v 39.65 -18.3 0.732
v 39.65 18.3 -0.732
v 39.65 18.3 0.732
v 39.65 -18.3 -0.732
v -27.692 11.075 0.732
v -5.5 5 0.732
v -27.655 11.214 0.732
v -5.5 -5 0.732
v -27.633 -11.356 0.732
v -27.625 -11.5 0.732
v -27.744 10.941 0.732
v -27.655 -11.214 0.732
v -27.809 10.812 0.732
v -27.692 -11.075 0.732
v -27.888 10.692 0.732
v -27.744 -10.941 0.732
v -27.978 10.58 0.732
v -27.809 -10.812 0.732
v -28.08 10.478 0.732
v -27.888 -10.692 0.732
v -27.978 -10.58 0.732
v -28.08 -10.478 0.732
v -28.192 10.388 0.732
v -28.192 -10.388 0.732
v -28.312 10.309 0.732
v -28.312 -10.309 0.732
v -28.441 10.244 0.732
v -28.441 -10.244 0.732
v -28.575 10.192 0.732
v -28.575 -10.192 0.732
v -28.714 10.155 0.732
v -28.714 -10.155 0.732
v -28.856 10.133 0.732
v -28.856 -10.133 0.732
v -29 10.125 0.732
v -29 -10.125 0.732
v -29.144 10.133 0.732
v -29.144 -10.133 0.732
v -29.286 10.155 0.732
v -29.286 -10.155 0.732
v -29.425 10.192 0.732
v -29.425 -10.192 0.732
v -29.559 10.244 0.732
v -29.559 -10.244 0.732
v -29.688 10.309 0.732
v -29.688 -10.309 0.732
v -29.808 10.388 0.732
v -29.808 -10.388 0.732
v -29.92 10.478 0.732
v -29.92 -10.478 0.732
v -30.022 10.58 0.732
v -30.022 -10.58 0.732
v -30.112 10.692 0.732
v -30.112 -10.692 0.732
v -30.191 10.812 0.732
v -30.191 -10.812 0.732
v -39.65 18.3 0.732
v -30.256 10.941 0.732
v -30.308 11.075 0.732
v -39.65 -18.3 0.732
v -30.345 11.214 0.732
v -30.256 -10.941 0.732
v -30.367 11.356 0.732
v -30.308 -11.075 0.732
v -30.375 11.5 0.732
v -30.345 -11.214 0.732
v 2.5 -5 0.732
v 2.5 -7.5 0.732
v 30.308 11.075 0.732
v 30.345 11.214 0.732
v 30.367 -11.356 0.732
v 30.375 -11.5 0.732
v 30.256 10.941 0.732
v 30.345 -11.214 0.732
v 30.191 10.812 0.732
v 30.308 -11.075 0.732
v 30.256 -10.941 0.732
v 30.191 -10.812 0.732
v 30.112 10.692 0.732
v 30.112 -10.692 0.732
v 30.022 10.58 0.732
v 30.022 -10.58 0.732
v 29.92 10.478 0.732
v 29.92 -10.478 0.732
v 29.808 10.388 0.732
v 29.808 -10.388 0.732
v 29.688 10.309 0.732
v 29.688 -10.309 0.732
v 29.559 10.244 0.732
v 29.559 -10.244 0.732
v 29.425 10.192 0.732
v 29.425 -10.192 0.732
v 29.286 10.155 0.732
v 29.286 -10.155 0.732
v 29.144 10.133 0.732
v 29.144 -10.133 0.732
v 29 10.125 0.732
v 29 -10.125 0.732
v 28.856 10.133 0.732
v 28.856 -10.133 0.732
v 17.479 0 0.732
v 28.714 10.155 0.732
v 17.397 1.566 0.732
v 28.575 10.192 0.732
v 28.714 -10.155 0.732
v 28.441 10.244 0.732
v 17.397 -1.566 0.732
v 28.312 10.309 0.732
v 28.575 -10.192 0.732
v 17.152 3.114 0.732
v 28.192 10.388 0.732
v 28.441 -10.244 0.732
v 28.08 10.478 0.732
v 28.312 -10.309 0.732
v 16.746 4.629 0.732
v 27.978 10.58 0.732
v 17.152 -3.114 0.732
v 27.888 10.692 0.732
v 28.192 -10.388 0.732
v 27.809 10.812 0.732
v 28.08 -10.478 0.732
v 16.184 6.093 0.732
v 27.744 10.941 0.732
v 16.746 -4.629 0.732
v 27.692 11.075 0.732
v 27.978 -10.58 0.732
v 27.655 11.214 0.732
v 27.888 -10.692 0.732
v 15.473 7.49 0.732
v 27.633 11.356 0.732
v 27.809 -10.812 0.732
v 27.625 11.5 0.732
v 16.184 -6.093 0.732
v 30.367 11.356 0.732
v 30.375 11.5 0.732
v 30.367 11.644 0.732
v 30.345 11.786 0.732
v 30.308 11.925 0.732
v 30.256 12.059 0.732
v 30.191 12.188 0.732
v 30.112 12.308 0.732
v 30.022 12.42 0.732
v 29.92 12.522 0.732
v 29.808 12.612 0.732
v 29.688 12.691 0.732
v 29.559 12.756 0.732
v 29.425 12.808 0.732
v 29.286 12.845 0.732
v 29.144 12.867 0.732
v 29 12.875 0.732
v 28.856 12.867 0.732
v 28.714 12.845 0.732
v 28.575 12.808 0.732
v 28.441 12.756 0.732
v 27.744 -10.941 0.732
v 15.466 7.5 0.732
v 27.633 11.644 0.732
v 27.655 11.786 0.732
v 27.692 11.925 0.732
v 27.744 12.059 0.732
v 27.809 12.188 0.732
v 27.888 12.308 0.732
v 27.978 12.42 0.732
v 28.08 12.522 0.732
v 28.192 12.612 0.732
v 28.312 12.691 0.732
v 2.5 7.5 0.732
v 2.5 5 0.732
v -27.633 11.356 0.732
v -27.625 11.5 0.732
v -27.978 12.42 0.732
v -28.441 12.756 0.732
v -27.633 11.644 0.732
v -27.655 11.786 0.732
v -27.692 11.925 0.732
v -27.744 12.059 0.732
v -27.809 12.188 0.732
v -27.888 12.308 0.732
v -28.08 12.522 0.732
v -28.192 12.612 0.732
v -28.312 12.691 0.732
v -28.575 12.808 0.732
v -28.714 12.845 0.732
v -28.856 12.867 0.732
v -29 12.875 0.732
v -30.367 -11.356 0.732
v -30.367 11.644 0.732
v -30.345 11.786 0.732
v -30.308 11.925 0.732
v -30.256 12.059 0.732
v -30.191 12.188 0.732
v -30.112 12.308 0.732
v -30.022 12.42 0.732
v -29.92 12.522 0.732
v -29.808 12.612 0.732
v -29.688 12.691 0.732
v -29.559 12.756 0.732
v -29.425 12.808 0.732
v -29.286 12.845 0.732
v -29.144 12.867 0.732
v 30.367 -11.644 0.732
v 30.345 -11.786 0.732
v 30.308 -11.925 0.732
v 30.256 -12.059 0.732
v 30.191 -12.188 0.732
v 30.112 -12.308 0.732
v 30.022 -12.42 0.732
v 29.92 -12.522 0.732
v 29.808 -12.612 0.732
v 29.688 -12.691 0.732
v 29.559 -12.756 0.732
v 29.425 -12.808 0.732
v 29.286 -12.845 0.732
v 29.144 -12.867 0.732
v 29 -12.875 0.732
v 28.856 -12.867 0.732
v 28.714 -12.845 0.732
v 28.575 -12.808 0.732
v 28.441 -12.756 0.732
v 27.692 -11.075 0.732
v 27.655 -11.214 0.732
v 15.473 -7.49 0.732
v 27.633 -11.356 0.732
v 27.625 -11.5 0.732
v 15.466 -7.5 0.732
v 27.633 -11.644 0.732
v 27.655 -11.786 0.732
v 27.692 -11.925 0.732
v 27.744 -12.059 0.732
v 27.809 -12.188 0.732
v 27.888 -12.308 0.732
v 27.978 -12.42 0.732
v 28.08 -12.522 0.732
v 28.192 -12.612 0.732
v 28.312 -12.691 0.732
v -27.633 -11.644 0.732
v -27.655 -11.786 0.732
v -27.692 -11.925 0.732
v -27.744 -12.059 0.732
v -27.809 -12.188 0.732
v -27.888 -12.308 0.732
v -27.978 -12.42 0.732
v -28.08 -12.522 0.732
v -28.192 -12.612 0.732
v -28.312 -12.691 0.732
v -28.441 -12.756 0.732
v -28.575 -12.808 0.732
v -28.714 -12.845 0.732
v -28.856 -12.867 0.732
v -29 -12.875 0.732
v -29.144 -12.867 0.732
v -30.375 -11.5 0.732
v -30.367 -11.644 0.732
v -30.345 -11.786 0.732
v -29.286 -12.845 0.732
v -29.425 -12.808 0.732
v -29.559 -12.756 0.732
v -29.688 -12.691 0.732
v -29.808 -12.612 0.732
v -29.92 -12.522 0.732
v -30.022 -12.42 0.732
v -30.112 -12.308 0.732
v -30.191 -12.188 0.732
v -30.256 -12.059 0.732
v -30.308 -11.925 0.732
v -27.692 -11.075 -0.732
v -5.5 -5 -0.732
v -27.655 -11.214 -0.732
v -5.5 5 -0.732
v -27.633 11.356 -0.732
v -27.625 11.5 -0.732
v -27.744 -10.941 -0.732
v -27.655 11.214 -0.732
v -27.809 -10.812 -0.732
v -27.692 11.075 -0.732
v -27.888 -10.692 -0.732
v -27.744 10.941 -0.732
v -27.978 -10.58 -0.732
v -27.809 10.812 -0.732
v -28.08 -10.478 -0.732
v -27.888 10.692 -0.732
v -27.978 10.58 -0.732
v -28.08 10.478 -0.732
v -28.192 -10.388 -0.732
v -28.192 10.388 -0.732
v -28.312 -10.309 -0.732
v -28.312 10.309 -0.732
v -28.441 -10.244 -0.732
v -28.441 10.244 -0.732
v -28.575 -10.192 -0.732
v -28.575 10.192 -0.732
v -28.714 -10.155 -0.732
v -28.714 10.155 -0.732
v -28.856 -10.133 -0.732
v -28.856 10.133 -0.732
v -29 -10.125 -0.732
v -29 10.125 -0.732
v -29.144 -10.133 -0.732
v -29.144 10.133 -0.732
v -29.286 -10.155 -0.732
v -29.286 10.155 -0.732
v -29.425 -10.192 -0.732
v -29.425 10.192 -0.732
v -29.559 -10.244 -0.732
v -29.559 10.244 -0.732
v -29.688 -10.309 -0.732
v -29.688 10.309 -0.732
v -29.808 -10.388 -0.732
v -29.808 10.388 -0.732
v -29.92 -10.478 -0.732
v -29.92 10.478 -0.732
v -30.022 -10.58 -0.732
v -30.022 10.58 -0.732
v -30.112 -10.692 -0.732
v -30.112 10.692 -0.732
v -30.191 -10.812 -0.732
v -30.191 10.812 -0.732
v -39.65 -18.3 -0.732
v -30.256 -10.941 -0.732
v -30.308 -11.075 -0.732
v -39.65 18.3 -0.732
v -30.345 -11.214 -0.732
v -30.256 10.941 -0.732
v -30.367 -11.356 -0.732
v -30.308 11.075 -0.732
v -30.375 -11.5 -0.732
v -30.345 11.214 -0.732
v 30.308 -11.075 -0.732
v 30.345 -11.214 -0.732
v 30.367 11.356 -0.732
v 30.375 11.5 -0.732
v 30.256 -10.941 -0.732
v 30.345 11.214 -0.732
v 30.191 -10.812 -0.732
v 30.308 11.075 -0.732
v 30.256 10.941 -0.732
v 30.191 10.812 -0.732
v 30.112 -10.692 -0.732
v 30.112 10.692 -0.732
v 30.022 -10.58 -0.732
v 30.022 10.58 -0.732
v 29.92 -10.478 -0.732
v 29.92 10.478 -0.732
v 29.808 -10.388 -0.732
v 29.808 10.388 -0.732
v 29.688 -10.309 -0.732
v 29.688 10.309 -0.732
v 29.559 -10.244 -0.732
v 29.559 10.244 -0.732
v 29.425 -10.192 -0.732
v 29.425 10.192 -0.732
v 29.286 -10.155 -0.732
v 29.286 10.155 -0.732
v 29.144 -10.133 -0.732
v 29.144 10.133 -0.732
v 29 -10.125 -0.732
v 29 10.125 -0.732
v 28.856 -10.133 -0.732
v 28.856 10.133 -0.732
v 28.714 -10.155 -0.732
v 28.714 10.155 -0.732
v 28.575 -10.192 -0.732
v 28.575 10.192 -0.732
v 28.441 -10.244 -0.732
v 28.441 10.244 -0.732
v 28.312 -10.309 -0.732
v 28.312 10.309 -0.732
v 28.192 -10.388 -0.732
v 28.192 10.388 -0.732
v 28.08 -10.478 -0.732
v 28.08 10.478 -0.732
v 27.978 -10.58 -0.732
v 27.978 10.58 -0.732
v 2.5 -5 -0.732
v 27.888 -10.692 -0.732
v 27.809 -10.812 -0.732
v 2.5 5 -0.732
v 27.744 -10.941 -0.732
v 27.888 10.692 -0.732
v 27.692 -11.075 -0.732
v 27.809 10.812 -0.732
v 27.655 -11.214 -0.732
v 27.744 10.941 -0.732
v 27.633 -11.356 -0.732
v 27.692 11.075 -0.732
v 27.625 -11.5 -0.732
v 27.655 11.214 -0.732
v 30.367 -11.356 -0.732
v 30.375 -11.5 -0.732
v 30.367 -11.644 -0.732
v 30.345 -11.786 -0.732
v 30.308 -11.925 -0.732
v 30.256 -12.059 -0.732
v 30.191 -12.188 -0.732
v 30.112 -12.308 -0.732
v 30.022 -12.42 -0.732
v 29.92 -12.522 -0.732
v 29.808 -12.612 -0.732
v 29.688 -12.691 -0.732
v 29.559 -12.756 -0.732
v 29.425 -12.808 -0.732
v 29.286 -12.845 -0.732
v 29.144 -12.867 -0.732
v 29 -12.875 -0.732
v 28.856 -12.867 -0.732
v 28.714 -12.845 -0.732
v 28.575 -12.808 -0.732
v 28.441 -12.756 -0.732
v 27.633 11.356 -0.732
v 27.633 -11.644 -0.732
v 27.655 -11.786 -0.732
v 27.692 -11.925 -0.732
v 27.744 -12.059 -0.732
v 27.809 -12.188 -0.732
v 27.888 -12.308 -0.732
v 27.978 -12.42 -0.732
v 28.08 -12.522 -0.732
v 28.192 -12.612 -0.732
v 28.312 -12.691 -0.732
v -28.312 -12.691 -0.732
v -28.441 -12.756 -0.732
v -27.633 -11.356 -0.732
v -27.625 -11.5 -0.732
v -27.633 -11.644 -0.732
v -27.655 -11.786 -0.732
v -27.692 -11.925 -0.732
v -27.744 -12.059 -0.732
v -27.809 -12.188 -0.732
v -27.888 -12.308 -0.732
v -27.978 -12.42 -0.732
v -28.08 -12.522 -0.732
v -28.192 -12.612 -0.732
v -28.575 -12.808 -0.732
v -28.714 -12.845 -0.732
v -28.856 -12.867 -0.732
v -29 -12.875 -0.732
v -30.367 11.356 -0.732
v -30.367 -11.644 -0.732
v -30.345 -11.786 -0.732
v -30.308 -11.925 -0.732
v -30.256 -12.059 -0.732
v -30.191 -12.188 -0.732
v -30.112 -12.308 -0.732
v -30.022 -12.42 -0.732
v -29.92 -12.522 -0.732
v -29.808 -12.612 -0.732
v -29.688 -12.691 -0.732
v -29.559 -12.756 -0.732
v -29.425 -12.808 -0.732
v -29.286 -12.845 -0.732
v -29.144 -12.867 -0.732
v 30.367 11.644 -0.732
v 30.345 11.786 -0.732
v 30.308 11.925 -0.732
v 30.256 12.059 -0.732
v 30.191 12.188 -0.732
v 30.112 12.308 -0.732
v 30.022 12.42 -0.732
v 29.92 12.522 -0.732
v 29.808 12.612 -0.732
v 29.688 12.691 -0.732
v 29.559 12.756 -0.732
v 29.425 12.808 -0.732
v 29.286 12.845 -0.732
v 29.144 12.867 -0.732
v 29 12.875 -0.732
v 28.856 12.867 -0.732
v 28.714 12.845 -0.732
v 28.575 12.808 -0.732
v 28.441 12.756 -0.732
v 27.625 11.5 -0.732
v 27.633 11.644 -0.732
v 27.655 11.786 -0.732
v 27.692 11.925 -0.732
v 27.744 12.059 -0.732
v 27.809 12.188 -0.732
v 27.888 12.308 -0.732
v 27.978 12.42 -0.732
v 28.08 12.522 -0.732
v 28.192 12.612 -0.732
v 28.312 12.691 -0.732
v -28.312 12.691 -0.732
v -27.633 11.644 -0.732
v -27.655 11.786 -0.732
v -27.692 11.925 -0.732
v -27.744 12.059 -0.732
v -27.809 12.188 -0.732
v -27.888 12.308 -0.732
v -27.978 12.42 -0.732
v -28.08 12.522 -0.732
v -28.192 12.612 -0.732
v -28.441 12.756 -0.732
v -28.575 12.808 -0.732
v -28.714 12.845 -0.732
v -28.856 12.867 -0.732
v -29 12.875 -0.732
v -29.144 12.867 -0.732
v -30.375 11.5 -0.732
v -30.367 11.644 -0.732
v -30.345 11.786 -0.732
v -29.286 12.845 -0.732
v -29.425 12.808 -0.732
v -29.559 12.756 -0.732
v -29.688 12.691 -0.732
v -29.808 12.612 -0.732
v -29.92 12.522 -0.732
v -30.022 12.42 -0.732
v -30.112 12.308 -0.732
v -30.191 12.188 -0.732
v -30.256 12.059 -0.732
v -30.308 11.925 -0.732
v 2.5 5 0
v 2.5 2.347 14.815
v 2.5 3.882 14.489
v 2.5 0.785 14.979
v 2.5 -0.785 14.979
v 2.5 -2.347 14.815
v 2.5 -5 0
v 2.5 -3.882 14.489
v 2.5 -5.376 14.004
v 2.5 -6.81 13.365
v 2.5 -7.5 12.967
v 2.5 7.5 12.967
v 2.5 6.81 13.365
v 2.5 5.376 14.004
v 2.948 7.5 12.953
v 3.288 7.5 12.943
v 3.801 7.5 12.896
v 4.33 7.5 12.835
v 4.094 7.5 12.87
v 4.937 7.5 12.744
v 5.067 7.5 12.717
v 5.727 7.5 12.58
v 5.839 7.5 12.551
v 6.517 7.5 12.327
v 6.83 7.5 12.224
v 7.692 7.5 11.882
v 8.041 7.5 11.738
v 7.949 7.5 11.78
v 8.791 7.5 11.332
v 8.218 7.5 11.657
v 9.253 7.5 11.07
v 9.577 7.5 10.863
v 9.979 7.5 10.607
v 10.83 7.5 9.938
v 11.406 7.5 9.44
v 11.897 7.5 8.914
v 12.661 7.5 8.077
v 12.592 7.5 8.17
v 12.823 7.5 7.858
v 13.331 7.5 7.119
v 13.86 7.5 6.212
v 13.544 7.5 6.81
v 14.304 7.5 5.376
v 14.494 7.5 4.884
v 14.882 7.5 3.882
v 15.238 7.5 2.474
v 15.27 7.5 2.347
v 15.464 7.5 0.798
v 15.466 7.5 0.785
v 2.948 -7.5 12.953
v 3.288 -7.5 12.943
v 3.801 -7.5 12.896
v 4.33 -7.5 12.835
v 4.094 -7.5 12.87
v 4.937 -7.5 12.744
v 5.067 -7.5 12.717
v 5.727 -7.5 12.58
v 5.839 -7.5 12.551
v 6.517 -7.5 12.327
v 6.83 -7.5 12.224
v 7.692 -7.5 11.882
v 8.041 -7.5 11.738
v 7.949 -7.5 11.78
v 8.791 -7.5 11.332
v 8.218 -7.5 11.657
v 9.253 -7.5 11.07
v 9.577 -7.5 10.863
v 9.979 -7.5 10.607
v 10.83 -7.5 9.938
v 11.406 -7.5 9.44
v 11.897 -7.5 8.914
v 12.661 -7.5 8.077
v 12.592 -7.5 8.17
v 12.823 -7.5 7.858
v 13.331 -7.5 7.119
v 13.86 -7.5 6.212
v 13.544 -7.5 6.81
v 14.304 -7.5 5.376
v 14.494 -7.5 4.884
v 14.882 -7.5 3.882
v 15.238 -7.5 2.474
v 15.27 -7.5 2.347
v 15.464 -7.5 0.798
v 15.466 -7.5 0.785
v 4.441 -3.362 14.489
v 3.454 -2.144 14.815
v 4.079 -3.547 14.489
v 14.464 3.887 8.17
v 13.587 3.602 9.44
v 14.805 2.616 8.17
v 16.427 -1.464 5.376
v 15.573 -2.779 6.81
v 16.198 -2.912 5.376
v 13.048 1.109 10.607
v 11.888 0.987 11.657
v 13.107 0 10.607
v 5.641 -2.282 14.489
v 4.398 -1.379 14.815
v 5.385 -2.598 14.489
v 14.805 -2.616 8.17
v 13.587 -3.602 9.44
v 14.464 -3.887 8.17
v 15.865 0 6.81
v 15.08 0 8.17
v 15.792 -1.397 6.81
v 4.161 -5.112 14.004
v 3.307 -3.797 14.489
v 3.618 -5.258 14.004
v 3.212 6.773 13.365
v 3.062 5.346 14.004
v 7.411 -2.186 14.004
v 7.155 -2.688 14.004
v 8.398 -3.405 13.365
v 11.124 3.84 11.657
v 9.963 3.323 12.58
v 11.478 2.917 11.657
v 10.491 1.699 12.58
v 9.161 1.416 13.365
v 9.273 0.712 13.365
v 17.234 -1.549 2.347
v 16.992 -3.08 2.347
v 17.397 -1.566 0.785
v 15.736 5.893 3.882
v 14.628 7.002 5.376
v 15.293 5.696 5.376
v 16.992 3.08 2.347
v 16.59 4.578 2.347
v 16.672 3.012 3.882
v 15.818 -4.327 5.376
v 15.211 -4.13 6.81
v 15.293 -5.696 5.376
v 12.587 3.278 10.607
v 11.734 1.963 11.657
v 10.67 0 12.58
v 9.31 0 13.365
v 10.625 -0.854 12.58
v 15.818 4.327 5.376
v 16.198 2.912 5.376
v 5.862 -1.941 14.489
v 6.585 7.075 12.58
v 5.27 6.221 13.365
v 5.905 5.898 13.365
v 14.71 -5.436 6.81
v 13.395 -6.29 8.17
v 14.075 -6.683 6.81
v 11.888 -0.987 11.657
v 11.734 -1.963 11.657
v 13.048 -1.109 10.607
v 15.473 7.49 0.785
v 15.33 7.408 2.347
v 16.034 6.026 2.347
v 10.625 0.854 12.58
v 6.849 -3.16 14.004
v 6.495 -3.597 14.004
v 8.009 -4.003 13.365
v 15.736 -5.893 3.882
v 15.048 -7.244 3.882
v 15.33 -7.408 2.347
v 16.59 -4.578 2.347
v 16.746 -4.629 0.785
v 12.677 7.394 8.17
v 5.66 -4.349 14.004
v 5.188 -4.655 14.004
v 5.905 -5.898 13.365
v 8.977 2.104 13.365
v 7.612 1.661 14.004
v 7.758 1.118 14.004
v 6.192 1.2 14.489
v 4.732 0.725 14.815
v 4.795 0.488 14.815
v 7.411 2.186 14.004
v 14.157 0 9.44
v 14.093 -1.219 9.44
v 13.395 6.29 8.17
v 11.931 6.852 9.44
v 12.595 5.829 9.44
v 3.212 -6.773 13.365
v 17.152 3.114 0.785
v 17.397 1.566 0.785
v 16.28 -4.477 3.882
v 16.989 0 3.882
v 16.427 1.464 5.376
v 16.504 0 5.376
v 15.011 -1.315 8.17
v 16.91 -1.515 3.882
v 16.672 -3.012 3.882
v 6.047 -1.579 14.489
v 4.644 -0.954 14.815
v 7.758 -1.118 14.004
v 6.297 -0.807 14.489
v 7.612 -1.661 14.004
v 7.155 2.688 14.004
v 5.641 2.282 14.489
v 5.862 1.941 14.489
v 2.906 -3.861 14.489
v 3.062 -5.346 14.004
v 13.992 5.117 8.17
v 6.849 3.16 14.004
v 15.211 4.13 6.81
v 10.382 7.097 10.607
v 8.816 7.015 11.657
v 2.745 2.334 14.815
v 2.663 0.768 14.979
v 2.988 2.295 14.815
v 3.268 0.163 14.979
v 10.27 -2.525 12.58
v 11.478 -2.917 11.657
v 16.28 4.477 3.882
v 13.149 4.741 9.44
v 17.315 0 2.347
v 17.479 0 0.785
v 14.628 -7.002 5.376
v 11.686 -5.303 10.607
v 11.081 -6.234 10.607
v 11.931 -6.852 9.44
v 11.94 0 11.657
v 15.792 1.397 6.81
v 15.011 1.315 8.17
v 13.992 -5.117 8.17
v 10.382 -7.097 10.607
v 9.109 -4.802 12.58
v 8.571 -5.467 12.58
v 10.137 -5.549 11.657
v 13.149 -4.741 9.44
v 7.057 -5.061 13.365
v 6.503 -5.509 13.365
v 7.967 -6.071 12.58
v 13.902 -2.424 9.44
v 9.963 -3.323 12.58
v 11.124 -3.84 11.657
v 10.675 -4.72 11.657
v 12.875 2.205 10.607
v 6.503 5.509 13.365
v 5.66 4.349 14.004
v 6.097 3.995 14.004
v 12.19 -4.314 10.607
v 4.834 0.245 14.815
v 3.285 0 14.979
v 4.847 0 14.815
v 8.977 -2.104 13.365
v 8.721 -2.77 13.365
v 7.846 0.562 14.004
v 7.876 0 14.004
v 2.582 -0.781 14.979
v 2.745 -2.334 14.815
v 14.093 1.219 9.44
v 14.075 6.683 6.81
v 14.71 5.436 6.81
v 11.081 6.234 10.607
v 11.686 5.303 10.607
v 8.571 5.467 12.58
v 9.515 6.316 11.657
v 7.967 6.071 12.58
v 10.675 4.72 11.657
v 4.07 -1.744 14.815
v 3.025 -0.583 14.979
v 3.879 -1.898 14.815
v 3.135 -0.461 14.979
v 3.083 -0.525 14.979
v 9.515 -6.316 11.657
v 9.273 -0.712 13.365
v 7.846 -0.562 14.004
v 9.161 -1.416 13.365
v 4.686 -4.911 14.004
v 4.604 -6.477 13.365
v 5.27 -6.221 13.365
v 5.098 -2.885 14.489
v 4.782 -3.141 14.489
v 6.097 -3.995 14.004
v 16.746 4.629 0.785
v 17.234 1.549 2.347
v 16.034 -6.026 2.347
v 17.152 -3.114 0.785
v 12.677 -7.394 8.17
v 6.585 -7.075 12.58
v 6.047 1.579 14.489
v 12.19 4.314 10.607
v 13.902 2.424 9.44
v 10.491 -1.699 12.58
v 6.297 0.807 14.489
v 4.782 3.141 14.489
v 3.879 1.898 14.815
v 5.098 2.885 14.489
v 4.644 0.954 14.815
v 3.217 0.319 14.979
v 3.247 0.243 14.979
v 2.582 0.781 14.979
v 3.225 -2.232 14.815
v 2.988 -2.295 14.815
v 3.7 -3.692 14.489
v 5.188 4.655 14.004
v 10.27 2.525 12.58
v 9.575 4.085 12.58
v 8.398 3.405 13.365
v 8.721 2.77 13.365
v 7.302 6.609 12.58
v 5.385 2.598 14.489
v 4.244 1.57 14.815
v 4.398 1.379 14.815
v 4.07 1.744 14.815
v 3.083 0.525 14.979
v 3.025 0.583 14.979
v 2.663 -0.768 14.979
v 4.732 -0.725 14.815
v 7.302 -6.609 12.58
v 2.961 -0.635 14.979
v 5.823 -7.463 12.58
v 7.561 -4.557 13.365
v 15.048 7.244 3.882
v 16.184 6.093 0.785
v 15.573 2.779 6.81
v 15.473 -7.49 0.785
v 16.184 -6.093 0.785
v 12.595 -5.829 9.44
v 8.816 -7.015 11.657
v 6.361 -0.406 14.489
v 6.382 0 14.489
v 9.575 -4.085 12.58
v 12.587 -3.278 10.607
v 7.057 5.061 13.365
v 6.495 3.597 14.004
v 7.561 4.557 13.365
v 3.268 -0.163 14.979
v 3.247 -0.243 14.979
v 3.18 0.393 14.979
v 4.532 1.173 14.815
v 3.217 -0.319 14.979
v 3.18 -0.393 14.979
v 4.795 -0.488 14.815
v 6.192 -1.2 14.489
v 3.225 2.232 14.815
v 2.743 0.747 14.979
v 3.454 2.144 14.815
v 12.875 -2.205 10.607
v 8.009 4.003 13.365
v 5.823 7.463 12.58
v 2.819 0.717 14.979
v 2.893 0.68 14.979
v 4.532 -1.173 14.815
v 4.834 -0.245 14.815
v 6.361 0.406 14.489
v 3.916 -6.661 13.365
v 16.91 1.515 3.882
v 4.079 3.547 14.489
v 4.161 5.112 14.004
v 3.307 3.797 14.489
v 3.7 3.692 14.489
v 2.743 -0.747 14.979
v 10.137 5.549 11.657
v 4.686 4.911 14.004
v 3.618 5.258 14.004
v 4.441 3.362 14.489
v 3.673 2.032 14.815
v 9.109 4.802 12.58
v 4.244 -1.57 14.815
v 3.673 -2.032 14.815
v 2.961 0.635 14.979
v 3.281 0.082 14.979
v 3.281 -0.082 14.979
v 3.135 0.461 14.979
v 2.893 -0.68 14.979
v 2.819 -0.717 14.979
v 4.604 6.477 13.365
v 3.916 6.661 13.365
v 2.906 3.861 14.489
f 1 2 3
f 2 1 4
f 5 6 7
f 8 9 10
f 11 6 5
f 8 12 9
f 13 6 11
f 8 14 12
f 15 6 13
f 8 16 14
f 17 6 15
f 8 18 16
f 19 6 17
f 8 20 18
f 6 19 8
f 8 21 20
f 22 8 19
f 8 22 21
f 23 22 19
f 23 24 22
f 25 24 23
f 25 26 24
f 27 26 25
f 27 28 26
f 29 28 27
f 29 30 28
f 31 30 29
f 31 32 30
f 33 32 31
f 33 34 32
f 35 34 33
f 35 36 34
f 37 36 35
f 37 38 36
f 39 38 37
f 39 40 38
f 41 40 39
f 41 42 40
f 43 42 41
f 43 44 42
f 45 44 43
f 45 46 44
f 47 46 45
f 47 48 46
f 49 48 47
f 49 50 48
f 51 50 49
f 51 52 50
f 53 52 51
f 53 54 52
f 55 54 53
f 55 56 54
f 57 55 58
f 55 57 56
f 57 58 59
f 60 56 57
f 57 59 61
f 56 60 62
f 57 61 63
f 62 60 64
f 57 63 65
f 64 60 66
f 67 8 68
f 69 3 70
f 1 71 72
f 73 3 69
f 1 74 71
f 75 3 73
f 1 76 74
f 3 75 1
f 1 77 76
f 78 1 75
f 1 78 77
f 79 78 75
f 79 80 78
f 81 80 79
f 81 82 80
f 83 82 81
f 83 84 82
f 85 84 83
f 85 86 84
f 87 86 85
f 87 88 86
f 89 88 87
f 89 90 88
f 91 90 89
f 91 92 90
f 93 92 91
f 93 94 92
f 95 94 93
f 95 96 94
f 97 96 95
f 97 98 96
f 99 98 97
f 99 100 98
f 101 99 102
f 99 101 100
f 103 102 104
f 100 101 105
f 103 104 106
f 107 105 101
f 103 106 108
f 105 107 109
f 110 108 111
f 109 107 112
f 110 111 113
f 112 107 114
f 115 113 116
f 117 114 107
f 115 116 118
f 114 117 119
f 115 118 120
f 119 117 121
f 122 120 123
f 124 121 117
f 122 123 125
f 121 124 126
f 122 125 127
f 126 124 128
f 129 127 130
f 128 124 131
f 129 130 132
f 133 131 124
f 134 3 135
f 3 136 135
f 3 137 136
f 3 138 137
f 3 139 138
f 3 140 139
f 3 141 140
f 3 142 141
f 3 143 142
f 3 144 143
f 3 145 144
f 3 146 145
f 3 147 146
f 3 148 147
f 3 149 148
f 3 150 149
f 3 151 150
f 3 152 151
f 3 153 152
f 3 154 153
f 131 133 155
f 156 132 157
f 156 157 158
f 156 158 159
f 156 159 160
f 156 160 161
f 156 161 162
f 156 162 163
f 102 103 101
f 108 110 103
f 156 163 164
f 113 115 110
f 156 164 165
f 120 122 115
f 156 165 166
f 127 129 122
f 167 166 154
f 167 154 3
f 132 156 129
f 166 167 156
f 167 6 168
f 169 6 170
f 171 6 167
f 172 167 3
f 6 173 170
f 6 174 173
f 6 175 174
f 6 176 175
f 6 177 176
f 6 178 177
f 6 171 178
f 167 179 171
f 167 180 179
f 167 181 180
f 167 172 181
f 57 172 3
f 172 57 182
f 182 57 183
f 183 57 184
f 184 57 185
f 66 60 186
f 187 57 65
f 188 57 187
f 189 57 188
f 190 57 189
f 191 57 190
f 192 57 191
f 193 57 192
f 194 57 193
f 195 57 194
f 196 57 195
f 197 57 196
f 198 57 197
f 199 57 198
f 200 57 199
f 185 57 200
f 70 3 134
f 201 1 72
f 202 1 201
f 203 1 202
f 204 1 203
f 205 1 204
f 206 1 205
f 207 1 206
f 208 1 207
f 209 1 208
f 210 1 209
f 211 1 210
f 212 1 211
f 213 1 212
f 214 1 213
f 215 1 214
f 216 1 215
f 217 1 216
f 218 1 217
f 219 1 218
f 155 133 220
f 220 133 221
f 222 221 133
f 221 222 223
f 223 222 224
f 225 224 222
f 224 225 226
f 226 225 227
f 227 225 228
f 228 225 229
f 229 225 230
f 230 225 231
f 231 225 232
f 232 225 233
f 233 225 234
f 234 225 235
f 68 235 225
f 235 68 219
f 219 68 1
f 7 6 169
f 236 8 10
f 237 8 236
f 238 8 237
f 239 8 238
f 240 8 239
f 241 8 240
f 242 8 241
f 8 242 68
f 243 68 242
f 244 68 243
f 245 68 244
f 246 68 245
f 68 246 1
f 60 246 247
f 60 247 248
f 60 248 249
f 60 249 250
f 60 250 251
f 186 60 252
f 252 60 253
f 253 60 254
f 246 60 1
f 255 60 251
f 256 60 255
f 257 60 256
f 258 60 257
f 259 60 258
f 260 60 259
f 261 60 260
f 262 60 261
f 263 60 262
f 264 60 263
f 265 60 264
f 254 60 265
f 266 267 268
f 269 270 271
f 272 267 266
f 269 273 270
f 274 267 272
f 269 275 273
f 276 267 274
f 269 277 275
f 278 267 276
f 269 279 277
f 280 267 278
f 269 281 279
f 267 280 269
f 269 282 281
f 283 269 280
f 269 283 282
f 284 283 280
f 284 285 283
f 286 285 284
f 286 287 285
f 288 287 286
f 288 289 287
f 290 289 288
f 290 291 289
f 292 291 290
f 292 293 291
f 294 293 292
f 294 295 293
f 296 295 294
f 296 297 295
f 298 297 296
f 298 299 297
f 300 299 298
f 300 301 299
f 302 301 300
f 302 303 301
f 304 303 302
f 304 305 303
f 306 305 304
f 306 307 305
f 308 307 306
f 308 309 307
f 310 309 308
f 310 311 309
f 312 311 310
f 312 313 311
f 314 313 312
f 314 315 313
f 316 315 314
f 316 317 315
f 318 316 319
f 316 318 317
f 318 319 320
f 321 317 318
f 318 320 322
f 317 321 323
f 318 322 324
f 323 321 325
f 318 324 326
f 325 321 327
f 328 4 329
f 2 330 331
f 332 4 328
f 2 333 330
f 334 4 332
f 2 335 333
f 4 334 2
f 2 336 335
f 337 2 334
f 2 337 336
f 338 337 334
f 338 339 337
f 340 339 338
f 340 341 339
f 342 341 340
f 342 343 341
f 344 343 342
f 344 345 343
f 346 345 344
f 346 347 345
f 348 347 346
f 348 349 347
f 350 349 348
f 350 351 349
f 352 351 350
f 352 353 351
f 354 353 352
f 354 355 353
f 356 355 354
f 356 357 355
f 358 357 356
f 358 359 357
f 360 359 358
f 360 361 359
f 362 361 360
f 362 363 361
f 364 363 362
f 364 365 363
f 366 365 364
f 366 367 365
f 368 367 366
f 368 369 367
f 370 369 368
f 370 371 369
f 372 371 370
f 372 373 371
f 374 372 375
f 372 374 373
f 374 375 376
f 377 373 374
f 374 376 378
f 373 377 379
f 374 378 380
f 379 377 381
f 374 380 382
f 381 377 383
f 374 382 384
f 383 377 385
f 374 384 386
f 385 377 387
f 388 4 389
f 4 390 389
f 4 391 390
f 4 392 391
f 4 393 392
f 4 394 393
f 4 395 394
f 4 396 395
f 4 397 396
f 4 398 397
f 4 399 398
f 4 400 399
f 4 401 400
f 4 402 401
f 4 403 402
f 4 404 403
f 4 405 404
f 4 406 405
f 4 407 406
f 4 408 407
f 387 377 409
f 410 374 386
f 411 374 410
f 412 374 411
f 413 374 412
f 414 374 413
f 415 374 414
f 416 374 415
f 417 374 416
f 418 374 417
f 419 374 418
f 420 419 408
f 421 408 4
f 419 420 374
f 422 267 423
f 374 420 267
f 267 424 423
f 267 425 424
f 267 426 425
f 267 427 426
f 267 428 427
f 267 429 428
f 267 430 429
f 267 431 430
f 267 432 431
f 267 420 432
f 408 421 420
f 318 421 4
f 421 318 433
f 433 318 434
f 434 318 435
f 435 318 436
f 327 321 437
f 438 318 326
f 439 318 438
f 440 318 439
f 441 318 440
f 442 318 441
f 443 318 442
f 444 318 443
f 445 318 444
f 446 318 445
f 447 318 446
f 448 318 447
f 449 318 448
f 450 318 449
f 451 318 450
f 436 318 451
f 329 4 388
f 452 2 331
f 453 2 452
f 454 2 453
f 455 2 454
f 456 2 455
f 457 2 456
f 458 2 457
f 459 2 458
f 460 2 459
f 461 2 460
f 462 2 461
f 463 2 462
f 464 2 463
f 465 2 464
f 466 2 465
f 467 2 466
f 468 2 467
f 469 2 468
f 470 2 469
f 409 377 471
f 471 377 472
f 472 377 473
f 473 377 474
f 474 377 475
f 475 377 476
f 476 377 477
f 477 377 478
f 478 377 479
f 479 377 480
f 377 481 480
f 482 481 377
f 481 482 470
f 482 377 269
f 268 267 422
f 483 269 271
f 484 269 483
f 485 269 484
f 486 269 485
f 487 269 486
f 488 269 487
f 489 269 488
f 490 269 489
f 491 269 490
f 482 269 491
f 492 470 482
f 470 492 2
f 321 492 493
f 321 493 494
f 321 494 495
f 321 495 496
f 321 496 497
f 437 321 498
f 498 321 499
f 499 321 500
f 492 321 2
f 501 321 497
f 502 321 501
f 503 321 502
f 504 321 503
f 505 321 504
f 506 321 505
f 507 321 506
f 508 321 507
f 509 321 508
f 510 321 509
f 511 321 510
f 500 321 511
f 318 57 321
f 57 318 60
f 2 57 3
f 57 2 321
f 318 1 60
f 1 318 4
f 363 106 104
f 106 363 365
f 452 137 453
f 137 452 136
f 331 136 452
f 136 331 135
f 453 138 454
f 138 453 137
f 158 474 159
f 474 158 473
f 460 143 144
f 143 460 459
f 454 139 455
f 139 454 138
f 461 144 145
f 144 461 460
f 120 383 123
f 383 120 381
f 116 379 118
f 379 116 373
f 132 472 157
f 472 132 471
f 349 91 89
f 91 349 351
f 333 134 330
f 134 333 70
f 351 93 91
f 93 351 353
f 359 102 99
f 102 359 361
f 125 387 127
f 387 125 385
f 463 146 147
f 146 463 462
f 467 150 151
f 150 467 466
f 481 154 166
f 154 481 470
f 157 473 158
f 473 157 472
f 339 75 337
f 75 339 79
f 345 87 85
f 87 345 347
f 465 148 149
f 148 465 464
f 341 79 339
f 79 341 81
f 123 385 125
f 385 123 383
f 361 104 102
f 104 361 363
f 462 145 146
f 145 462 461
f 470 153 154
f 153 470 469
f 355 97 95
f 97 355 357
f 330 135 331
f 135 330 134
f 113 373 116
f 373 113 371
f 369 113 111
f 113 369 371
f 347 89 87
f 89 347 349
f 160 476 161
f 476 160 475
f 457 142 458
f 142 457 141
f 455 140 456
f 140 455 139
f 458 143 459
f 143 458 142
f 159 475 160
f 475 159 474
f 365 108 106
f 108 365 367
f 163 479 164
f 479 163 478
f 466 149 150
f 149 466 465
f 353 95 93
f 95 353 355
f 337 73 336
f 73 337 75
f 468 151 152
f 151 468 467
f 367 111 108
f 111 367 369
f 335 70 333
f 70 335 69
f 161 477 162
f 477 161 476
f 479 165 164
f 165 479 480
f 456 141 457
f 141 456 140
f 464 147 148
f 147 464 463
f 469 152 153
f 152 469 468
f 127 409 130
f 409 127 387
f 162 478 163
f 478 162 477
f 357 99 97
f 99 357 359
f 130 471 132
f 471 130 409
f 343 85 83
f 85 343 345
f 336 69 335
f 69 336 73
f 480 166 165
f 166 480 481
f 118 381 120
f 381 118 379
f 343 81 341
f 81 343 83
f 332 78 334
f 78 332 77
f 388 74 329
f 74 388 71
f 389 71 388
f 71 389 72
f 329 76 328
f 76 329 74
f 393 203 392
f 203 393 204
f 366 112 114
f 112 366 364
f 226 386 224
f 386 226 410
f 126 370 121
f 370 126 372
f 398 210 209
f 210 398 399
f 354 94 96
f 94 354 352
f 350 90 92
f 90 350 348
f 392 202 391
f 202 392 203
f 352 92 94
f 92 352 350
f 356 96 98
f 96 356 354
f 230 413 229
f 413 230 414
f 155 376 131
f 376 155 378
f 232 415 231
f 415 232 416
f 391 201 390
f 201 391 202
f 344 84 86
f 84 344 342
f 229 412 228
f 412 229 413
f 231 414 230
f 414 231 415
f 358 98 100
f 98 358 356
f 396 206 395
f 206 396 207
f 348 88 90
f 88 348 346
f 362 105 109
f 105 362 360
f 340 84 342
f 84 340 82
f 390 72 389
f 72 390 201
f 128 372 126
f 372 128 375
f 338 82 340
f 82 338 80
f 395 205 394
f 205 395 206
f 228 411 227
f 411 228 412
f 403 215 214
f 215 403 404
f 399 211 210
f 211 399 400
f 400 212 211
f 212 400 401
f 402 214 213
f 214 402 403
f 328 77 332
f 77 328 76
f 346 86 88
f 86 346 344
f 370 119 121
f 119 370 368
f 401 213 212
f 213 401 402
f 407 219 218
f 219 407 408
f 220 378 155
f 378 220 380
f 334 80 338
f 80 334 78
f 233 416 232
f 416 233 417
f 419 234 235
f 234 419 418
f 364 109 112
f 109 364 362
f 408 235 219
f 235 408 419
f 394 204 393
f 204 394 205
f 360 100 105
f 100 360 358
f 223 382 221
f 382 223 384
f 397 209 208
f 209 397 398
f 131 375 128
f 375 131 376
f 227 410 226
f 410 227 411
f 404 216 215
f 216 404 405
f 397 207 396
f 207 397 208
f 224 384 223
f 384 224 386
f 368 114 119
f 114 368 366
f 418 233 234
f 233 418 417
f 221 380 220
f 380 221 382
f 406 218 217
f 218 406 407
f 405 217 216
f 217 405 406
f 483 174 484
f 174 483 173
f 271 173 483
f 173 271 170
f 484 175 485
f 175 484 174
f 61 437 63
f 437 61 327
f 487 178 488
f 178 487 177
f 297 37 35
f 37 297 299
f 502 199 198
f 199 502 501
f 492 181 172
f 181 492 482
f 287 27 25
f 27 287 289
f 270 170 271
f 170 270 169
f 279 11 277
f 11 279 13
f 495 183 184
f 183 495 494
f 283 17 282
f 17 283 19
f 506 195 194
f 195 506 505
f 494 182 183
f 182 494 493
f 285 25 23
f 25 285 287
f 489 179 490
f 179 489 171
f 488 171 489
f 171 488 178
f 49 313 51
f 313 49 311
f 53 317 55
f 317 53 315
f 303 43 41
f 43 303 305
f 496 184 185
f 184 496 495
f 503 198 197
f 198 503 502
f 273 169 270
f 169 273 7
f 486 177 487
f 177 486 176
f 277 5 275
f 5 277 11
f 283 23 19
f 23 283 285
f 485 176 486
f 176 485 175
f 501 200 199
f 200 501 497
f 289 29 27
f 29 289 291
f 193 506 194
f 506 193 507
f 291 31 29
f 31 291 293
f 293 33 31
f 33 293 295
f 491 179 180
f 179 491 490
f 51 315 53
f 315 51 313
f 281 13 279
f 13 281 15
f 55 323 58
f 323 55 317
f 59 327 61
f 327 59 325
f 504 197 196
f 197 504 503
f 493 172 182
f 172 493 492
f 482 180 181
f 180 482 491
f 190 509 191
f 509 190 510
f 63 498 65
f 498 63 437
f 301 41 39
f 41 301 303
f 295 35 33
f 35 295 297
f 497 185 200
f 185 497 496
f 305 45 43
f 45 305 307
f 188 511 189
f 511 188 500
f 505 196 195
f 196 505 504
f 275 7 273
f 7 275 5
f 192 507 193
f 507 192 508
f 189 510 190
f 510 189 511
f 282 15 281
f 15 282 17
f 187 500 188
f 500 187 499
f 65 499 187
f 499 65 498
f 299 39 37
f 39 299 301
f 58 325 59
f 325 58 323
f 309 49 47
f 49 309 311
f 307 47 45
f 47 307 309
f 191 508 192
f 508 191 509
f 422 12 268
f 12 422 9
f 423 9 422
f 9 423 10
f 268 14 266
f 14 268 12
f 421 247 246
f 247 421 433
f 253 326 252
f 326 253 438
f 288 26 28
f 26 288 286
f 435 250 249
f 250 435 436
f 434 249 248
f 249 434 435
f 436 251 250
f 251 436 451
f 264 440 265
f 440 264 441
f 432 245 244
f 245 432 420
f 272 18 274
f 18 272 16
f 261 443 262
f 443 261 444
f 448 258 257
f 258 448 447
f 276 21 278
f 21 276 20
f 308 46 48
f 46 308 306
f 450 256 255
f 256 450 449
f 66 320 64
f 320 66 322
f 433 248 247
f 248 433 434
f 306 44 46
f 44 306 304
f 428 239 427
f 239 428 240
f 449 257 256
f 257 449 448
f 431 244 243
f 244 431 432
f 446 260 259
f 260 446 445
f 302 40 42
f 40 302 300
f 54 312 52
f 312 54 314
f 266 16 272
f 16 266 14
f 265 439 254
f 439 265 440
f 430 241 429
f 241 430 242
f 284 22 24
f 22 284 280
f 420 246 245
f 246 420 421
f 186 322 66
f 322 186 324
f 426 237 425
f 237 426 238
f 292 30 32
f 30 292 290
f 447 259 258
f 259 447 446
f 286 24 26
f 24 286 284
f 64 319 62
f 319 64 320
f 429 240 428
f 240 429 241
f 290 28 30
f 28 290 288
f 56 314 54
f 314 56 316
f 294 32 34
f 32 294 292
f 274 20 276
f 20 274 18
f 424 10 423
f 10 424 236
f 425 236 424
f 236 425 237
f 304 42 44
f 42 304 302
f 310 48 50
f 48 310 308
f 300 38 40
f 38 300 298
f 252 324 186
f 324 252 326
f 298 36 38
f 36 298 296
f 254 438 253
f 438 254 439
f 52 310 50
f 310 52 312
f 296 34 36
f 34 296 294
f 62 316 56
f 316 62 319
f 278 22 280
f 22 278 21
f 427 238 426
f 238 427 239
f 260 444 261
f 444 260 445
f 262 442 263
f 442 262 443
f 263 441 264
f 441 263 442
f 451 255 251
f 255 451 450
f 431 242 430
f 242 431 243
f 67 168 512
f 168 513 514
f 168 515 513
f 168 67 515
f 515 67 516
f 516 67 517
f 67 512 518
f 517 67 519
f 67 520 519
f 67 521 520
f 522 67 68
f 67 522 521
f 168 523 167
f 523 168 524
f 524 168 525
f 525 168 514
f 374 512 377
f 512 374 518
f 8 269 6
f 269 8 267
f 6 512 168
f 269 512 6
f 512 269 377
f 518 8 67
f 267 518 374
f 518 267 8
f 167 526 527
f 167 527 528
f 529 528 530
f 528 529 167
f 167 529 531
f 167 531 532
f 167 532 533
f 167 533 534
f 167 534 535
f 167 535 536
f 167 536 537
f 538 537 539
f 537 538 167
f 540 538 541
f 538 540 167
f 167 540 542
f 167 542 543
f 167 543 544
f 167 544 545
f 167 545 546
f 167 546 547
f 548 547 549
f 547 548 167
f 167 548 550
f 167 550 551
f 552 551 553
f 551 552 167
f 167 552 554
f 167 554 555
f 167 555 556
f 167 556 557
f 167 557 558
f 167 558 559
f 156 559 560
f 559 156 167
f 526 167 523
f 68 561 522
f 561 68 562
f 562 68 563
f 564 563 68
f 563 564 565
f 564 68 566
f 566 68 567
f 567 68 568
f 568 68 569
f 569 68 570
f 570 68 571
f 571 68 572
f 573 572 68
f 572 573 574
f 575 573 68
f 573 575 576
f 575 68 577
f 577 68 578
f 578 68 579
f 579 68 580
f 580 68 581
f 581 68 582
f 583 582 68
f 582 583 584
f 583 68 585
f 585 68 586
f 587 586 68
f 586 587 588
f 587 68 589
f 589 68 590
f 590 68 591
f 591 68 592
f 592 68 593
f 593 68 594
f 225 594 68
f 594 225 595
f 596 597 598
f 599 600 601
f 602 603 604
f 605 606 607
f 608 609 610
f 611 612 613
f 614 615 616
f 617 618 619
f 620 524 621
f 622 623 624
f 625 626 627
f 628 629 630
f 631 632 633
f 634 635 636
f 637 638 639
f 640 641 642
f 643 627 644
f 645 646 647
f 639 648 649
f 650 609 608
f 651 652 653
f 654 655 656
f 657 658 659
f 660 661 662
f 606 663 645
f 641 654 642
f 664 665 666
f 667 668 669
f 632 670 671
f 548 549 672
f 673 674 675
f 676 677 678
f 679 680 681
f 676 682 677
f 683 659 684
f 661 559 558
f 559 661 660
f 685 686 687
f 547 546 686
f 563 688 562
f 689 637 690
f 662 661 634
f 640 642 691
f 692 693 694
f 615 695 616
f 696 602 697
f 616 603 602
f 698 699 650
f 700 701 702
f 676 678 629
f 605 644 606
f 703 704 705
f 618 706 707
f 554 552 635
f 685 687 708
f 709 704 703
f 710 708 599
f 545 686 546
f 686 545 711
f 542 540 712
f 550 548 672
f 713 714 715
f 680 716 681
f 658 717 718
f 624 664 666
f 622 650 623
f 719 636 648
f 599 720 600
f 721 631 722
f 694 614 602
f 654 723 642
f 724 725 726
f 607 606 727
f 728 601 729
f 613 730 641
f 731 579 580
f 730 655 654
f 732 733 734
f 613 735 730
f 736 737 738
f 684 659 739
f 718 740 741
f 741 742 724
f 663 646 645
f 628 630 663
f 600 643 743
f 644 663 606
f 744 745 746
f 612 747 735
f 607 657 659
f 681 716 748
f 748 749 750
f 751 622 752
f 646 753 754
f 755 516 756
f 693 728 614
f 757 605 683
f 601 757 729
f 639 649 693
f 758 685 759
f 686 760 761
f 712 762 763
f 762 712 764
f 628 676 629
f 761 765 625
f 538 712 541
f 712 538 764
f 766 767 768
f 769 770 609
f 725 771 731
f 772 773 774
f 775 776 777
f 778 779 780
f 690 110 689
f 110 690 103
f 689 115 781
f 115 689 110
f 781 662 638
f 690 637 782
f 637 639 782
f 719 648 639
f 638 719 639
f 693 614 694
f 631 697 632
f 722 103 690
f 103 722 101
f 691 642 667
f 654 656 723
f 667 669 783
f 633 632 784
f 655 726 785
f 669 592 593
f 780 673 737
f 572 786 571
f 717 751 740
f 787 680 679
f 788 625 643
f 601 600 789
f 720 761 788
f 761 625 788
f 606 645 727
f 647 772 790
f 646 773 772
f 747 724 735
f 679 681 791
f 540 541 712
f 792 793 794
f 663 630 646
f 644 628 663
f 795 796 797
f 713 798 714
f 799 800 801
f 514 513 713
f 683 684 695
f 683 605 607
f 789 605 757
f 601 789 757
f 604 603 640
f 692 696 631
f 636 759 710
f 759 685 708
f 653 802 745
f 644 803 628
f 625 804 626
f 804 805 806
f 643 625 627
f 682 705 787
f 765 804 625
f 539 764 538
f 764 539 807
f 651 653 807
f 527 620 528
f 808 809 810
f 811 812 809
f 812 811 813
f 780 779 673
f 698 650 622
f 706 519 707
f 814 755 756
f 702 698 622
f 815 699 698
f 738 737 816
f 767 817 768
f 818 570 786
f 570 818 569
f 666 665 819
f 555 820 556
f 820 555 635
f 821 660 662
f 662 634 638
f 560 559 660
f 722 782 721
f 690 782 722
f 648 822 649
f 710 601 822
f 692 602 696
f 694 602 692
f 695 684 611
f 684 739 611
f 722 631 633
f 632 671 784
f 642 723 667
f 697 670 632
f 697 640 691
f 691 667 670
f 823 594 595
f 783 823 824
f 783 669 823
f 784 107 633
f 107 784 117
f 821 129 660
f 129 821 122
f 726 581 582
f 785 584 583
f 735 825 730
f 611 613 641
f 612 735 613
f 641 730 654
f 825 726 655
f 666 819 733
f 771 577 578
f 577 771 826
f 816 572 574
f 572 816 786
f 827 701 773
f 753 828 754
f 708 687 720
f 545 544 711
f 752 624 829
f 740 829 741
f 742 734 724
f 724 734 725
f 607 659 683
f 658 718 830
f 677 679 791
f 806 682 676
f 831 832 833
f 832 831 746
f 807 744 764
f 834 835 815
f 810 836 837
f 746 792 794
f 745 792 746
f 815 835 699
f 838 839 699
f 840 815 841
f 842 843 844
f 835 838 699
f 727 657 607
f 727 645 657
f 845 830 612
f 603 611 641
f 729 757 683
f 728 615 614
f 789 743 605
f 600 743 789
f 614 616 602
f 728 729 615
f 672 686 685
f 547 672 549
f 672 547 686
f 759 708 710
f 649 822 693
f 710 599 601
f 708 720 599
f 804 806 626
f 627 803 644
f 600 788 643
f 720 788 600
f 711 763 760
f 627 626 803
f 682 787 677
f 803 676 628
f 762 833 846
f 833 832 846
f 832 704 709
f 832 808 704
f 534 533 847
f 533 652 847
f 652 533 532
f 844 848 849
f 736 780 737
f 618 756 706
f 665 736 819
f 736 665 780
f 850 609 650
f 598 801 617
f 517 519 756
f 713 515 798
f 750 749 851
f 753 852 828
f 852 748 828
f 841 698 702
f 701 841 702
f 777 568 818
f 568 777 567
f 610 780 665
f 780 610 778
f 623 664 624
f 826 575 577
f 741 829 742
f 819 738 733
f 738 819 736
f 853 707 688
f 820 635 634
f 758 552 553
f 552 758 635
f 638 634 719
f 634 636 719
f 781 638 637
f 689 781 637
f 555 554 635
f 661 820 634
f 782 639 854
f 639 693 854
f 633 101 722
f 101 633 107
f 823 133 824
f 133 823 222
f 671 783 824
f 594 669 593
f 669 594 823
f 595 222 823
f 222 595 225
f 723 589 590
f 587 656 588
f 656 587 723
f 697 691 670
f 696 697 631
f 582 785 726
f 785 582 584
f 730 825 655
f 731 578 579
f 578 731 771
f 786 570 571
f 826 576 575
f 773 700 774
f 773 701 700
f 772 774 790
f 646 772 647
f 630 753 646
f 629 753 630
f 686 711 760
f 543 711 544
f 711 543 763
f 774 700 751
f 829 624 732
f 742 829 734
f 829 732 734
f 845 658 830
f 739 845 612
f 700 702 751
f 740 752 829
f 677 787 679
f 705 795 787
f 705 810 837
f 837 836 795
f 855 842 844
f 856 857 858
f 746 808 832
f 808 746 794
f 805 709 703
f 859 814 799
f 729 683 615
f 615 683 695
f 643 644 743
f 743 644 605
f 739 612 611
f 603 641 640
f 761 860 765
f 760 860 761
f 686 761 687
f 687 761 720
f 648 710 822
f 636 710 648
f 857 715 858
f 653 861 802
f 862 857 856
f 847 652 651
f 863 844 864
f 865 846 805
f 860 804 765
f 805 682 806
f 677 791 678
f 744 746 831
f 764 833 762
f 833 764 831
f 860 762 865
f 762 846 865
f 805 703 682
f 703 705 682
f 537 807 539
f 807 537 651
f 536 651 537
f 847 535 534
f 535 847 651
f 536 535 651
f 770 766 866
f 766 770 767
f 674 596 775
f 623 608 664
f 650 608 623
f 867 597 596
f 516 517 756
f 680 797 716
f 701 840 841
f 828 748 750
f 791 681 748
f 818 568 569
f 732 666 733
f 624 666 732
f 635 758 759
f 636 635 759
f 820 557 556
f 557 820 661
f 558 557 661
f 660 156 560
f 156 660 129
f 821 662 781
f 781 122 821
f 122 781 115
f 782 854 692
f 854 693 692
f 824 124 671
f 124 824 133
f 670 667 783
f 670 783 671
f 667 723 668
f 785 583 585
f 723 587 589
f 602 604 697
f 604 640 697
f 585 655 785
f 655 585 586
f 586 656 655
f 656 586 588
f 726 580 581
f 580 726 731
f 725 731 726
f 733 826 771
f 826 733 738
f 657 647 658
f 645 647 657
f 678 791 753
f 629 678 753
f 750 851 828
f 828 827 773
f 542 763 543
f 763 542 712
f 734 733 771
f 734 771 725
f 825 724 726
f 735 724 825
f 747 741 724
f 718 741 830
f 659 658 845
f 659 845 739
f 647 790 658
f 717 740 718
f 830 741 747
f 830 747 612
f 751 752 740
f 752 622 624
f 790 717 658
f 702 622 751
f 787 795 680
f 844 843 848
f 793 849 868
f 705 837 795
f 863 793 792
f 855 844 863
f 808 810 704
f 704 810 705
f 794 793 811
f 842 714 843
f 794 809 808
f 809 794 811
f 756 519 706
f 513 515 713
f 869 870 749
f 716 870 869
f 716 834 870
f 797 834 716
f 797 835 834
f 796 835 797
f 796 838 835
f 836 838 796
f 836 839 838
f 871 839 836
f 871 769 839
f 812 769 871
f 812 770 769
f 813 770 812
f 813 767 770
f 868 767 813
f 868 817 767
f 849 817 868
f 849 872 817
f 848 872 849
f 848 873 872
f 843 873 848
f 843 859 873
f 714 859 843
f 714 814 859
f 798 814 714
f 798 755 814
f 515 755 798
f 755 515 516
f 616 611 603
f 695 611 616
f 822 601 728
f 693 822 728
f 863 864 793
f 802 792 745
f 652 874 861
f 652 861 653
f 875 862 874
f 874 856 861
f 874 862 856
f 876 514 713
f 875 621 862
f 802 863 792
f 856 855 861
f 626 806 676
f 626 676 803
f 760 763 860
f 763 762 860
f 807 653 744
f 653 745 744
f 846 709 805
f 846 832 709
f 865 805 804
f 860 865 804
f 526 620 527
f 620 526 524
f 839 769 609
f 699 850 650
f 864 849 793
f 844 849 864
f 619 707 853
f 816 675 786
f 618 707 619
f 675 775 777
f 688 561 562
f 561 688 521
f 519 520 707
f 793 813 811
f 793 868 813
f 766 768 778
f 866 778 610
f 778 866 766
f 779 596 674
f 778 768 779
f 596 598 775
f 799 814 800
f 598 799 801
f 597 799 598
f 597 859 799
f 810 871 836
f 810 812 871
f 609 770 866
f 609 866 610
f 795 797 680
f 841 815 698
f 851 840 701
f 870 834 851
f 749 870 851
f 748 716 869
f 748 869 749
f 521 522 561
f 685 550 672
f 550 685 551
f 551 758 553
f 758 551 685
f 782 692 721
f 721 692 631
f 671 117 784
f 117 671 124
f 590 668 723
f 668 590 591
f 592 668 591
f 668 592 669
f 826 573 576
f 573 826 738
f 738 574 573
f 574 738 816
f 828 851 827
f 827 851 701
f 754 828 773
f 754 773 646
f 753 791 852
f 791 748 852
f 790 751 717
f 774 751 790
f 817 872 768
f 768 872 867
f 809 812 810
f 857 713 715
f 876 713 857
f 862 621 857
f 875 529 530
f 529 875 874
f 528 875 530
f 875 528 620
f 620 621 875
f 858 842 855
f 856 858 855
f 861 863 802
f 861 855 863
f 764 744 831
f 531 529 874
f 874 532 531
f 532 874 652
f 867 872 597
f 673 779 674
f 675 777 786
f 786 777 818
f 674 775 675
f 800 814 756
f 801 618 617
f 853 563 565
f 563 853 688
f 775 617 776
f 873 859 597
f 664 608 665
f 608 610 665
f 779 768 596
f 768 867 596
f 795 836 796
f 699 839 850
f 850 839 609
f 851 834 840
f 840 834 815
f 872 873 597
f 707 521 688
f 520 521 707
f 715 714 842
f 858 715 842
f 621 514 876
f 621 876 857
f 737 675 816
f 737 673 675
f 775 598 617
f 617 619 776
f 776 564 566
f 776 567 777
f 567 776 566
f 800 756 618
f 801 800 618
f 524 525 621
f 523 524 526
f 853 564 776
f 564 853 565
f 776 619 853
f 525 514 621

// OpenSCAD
outterSize = [65,30,1.2];
drill = [58, 23, 1];
drilloffset = drill/2;
holesize = 2.75;
$fn = 60;

difference(){
    cube(outterSize*1.22, center = true);
    
    translate([drilloffset.x, drilloffset.y,0])
        cylinder(20, d = holesize, center = true);
    translate([drilloffset.x, -drilloffset.y,0])
        cylinder(20, d = holesize, center = true);
    translate([-drilloffset.x, drilloffset.y,0])
        cylinder(20, d = holesize, center = true);
    translate([-drilloffset.x, -drilloffset.y,0])
        cylinder(20, d = holesize, center = true);
    
   //cam cable
    translate([-1.5,0,0])
        cube([8,10,5],center = true);
}

 // cam mount
 translate([10,0,15/2])
intersection(){
   
        cube([15,15,15],center = true);
    translate([-15/2,0,-15/2])
         sphere(r = 15);
    
    
}
